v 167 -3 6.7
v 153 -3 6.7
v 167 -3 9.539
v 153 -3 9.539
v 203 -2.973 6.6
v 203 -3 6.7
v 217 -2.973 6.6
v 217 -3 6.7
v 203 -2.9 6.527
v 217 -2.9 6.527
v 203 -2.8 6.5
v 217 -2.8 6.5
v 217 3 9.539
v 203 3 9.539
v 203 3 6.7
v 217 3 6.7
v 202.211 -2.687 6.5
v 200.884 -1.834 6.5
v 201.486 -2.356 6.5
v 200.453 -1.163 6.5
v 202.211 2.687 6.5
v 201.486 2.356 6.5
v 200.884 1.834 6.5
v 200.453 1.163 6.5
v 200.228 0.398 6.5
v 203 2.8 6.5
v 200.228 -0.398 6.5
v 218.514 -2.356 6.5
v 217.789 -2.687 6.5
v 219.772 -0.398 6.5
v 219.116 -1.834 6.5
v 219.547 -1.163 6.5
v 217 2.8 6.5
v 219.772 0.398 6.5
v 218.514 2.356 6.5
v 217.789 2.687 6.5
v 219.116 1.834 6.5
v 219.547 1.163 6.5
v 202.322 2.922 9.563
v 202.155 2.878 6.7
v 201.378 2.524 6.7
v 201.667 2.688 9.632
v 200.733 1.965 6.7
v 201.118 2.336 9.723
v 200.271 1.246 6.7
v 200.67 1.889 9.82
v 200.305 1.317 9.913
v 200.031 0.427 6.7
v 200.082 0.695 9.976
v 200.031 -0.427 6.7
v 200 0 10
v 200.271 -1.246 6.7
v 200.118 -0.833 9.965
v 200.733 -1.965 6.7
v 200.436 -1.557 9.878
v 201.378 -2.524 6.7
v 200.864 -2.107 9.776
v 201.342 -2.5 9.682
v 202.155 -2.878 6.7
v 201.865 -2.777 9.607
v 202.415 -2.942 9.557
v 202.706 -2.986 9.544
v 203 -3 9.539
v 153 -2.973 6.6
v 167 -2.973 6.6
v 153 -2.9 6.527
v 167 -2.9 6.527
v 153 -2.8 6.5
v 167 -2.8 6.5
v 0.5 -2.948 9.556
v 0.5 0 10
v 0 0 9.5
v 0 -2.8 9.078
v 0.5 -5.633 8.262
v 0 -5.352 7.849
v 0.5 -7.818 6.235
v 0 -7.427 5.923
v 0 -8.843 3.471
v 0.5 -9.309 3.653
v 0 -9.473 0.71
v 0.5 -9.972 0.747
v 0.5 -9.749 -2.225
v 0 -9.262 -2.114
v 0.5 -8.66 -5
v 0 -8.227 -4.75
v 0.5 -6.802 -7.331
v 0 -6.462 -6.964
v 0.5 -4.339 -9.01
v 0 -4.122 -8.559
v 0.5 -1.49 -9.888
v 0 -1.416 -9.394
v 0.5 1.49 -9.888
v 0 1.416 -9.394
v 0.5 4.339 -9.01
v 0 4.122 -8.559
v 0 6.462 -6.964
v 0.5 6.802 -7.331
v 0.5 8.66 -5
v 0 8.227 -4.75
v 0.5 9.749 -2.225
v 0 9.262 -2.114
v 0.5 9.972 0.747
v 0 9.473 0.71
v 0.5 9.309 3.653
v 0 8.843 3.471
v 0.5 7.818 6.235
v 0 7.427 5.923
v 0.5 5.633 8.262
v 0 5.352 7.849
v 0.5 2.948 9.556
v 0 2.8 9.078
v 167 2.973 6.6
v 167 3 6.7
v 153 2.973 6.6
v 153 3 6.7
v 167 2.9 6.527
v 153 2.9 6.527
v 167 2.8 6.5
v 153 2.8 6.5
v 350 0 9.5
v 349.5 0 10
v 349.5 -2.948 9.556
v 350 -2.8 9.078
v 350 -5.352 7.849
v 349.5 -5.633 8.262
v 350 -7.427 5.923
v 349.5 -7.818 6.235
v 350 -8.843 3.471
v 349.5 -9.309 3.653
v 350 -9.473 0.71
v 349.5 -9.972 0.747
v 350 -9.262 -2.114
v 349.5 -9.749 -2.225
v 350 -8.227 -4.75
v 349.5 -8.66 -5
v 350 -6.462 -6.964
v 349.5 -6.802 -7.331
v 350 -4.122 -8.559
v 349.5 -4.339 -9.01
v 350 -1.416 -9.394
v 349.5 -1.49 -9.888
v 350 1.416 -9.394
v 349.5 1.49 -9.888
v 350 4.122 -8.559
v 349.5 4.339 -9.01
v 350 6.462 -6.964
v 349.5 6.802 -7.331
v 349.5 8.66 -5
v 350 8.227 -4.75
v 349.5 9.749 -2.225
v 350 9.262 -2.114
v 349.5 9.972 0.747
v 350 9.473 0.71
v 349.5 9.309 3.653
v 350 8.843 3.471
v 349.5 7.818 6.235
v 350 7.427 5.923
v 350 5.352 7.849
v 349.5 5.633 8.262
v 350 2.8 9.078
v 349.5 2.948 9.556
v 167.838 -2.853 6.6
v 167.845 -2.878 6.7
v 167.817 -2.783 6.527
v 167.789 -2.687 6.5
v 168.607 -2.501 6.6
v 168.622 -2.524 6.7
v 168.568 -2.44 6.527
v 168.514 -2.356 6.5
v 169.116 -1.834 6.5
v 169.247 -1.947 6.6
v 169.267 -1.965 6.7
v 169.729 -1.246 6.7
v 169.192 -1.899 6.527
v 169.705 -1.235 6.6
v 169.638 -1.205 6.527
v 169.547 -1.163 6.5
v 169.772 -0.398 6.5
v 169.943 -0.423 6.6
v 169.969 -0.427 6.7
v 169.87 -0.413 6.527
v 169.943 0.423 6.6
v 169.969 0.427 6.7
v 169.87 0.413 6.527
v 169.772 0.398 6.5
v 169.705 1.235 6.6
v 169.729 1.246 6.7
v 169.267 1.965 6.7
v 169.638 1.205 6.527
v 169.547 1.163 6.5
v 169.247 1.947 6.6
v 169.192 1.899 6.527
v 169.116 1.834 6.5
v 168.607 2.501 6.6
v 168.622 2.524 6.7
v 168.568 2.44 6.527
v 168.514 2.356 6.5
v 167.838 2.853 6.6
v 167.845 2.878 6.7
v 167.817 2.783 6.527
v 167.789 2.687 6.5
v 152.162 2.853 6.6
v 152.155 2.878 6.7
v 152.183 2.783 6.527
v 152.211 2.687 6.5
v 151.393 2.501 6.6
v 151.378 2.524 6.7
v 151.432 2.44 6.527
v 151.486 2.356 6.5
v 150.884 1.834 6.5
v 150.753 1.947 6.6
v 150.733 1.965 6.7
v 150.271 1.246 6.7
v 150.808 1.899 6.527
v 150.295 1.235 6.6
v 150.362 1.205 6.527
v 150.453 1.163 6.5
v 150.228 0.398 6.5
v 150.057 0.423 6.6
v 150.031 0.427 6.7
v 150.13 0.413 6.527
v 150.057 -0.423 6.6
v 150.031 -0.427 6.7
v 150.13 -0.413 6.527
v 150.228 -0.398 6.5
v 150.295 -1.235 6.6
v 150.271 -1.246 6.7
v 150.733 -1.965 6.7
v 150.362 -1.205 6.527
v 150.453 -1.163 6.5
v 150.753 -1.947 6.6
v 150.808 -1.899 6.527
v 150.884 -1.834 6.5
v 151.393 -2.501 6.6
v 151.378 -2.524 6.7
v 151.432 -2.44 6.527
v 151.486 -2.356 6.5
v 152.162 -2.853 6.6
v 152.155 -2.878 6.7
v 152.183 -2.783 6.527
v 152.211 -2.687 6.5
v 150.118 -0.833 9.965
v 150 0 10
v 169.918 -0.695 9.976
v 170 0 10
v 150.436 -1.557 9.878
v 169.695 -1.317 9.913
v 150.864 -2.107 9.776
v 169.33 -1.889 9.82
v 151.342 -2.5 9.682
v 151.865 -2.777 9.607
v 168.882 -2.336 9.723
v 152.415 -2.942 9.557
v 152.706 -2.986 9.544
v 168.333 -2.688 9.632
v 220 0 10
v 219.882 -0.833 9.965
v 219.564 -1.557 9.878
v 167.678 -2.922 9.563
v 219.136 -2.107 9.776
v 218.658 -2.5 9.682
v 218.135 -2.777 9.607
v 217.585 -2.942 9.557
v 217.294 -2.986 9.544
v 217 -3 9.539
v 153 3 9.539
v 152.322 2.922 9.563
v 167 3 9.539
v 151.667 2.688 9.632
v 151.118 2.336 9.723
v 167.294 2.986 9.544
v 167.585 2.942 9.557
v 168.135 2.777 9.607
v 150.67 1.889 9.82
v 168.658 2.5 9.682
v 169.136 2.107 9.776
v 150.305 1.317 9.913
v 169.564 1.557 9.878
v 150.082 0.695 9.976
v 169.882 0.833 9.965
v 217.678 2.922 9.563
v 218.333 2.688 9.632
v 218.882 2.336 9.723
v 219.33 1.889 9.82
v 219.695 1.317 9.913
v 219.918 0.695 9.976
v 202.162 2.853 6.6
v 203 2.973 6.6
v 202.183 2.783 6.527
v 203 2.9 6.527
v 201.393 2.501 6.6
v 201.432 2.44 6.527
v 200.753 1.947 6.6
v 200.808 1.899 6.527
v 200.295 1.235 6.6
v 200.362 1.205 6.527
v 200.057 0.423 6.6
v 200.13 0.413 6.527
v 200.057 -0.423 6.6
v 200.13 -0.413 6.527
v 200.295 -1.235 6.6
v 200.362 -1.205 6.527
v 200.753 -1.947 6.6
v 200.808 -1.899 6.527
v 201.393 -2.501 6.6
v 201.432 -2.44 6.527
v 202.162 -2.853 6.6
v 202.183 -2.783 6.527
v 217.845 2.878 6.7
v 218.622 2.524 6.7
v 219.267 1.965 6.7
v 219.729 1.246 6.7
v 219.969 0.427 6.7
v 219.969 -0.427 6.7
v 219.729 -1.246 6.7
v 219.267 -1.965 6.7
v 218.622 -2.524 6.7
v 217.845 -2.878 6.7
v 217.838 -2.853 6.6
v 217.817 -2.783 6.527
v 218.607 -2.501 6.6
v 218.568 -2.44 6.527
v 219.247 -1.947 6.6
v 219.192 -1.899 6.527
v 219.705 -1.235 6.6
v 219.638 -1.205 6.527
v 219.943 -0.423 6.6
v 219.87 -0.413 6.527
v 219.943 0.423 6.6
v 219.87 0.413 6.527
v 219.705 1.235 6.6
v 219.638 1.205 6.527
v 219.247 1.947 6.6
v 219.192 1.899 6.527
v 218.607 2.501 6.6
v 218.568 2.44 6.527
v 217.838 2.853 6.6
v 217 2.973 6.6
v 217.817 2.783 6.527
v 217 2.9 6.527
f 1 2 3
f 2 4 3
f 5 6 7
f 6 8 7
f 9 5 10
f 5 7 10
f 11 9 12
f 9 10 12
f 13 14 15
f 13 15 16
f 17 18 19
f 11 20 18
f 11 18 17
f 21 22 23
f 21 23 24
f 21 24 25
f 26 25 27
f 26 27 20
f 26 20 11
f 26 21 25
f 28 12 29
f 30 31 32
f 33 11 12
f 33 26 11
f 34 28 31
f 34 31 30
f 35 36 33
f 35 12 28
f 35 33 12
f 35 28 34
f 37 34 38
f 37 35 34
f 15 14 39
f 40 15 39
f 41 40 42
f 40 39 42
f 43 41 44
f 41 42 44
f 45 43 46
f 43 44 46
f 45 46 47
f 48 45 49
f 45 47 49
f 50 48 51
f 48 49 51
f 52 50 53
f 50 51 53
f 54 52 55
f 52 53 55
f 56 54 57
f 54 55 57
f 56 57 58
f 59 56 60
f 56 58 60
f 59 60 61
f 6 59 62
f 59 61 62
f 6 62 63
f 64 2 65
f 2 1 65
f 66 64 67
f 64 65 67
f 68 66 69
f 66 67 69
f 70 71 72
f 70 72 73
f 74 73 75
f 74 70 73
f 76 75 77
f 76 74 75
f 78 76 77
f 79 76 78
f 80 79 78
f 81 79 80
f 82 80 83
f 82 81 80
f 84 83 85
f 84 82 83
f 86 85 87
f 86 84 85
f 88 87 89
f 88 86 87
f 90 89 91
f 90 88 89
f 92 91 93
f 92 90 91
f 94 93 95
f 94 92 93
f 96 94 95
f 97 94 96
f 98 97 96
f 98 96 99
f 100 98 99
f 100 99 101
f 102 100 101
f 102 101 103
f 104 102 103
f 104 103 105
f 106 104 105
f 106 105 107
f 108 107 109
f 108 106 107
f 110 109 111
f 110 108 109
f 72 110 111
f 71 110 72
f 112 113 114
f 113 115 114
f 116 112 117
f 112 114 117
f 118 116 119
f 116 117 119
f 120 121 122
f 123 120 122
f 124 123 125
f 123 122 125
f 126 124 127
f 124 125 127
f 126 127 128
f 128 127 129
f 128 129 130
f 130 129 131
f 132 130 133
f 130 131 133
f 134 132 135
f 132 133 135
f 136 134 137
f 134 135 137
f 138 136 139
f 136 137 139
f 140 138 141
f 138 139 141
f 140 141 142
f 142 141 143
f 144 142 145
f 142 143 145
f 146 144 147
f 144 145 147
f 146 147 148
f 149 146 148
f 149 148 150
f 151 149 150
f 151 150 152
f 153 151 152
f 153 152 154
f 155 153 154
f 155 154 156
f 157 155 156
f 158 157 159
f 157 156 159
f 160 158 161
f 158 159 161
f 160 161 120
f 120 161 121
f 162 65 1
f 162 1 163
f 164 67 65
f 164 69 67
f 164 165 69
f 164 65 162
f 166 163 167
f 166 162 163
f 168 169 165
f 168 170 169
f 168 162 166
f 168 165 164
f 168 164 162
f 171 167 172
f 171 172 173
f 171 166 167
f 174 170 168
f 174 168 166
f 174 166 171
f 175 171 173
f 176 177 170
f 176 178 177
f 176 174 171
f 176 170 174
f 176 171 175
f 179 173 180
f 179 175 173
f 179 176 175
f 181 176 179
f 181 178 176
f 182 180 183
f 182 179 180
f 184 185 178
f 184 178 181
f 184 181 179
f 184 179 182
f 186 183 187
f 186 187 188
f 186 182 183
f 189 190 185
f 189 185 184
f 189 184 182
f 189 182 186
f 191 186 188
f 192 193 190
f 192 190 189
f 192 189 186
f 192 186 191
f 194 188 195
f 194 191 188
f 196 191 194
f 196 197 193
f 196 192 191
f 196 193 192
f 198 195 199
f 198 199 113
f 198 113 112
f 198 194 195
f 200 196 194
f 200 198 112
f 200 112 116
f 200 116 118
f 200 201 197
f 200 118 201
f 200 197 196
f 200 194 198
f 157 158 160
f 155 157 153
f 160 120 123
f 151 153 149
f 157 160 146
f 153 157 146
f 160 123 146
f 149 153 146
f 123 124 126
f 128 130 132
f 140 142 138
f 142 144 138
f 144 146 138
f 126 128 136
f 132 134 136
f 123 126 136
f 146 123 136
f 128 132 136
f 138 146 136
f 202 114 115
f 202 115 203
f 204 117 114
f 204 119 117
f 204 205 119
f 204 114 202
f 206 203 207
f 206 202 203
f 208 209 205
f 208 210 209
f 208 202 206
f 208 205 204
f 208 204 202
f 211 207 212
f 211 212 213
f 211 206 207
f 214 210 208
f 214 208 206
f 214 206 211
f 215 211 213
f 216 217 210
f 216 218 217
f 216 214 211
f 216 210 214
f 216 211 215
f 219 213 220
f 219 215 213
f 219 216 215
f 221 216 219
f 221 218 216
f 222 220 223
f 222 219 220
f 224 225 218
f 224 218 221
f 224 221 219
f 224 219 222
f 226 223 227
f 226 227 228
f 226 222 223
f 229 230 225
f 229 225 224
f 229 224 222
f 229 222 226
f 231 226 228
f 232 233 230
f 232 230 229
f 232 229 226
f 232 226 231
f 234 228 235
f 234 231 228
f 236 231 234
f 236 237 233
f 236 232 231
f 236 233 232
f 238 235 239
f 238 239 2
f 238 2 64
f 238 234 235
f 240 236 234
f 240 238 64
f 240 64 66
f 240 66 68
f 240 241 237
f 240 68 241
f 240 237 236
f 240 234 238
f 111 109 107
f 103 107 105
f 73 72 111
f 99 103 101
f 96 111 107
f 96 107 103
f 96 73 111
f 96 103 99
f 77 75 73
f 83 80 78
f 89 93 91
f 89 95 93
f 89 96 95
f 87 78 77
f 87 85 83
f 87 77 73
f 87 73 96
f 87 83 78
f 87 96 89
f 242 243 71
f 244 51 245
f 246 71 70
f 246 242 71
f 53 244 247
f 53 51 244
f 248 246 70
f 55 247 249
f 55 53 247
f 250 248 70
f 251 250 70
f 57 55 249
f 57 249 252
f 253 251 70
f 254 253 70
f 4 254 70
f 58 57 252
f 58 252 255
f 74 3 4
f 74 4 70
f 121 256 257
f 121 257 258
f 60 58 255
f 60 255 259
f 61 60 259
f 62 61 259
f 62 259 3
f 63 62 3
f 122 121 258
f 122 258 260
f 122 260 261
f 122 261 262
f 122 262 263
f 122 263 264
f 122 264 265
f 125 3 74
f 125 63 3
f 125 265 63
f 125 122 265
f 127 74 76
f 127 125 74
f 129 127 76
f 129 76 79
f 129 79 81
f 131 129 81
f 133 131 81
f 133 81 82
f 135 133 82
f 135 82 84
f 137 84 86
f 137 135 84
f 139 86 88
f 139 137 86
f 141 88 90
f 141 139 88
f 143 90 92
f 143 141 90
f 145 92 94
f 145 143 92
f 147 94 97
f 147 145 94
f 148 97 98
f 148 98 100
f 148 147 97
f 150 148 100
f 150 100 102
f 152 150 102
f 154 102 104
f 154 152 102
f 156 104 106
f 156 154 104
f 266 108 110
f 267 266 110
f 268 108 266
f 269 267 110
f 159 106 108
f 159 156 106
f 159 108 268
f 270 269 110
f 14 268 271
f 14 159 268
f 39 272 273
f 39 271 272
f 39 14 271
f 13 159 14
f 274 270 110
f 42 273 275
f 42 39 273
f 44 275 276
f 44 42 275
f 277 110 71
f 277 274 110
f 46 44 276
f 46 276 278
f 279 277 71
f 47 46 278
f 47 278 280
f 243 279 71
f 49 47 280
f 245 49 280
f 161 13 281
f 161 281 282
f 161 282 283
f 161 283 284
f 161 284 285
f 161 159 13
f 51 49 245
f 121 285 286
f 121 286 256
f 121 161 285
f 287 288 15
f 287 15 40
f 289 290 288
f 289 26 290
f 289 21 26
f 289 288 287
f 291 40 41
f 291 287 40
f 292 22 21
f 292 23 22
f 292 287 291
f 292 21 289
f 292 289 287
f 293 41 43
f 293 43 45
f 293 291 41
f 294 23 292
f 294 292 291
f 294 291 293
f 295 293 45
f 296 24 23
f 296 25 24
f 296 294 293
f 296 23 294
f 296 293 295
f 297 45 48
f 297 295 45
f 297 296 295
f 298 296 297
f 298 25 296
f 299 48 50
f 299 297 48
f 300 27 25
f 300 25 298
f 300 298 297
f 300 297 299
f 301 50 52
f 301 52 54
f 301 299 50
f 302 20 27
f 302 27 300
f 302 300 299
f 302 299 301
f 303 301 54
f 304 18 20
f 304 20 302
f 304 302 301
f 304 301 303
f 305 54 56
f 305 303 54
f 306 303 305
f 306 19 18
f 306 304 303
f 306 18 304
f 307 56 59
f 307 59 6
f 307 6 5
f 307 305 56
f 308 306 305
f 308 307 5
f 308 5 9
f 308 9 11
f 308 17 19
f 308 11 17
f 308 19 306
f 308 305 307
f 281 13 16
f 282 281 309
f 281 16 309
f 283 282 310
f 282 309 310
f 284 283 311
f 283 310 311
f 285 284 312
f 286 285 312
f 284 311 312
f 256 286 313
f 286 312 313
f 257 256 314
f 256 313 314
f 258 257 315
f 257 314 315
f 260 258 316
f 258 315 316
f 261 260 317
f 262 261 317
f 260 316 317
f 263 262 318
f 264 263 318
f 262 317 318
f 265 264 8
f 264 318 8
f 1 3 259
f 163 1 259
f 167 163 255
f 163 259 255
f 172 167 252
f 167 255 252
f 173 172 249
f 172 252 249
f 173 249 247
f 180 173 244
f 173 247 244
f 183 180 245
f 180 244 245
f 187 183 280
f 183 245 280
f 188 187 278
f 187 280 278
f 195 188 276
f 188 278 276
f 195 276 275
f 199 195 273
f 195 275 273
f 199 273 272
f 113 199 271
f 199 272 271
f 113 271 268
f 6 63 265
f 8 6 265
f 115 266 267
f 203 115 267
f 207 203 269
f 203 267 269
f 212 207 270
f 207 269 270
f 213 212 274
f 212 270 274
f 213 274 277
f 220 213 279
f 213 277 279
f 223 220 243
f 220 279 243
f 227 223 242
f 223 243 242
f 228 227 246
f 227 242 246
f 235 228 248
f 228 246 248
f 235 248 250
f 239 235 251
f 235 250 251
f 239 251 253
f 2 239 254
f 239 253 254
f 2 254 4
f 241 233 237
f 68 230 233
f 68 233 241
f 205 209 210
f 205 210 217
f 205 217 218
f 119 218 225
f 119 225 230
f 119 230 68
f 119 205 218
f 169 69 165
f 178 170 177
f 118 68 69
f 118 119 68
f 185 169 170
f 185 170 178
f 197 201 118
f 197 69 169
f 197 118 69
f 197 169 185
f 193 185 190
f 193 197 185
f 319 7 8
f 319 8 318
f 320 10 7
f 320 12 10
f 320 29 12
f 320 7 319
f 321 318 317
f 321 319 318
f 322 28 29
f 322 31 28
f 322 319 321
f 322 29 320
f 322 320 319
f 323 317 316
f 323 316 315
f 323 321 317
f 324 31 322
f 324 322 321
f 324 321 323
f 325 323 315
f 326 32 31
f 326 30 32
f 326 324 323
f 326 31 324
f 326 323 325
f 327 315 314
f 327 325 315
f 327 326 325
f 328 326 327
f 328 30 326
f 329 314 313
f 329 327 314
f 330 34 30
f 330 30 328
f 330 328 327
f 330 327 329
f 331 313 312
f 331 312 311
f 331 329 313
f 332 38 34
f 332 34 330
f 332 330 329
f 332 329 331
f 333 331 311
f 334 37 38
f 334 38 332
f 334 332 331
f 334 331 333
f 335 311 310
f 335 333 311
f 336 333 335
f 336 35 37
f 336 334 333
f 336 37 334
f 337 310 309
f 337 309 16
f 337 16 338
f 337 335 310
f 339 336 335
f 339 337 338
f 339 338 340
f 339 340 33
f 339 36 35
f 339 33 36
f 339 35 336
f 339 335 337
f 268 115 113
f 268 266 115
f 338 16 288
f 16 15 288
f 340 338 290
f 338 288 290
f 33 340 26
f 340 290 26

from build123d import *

# Parameters (mm, degrees)
SKETCH1_W           = 350
SKETCH1_H           = 10
CHAMFER1_SIZE       = 0.5
SKETCH2_W           = 20
SKETCH2_H           = 6
BOSS_EXTRUDE1_DEPTH = 3.5
FILLET1_RADIUS      = 3
FILLET1_LENGTH      = 3.5
FILLET2_RADIUS      = 3
FILLET2_LENGTH      = 3.5
FILLET3_R           = 0.2
SKETCH4_W           = 20
SKETCH4_H           = 6
BOSS_EXTRUDE3_DEPTH = 3.5
FILLET4_RADIUS      = 3
FILLET4_LENGTH      = 3.5
FILLET5_RADIUS      = 3
FILLET5_LENGTH      = 3.5
FILLET6_R           = 0.2


with BuildPart() as part:
    # Sketch1 → Revolve1 (revolve)
    with BuildSketch(Plane.XY, mode=Mode.PRIVATE) as revolve1_sk:
        with Locations((175, 5)):
            Rectangle(SKETCH1_W, SKETCH1_H)
    revolve(revolve1_sk.sketch.rotate(Axis((0, 0, 0), (1, 0, 0)), 90), axis=Axis((0, 0, 0), (1, 0, 0)))

    # Chamfer1
    chamfer1_edges = [part.edges().sort_by_distance(p)[0] for p in [
        (0, 0, -10),
        (350, 0, -10),
    ]]
    chamfer(chamfer1_edges, length=CHAMFER1_SIZE)


with BuildPart() as body_2:
    # Sketch2 → Boss-Extrude1 (new body)
    with BuildSketch(Plane.XY.offset(10)):
        with Locations((160, 0)):
            Rectangle(SKETCH2_W, SKETCH2_H)
    extrude(amount=-BOSS_EXTRUDE1_DEPTH)

    # Fillet1: full round fillet: the end face becomes a half cylinder, R = half its width
    fillet1_face = Plane((150, 0, 8.25), x_dir=(0, 0, 1), z_dir=(-1, 0, 0))  # on the end face: x along it, z out of the body
    fillet1_slab = fillet1_face.offset(-FILLET1_RADIUS / 2) * Box(FILLET1_LENGTH, 2 * FILLET1_RADIUS, FILLET1_RADIUS, mode=Mode.PRIVATE)  # the body's end, R deep
    fillet1_round = Plane((153, 0, 8.25), x_dir=(-1, 0, 0), z_dir=(0, 0, 1)) * Cylinder(FILLET1_RADIUS, FILLET1_LENGTH, mode=Mode.PRIVATE)  # its axis R under the face
    add(fillet1_slab - fillet1_round, mode=Mode.SUBTRACT)

    # Fillet2: full round fillet: the end face becomes a half cylinder, R = half its width
    fillet2_face = Plane((170, 0, 8.25), x_dir=(0, 0, 1), z_dir=(1, 0, 0))  # on the end face: x along it, z out of the body
    fillet2_slab = fillet2_face.offset(-FILLET2_RADIUS / 2) * Box(FILLET2_LENGTH, 2 * FILLET2_RADIUS, FILLET2_RADIUS, mode=Mode.PRIVATE)  # the body's end, R deep
    fillet2_round = Plane((167, 0, 8.25), x_dir=(1, 0, 0), z_dir=(0, 0, 1)) * Cylinder(FILLET2_RADIUS, FILLET2_LENGTH, mode=Mode.PRIVATE)  # its axis R under the face
    add(fillet2_slab - fillet2_round, mode=Mode.SUBTRACT)

    # Fillet3
    fillet3_edges = [body_2.edges().sort_by_distance(p)[0] for p in [
        (160, -3, 6.5),
        (150, 0, 6.5),
        (160, 3, 6.5),
        (170, 0, 6.5),
    ]]
    fillet(fillet3_edges, radius=FILLET3_R)


with BuildPart() as part_1:
    add(part.part)

    # Combine1: cut body 2
    add(body_2.part, mode=Mode.SUBTRACT)


with BuildPart() as body_2_2:
    # Sketch4 → Boss-Extrude3 (new body)
    with BuildSketch(Plane.XY.offset(10)):
        with Locations((210, 0)):
            Rectangle(SKETCH4_W, SKETCH4_H)
    extrude(amount=-BOSS_EXTRUDE3_DEPTH)

    # Fillet4: full round fillet: the end face becomes a half cylinder, R = half its width
    fillet4_face = Plane((200, 0, 8.25), x_dir=(0, 0, 1), z_dir=(-1, 0, 0))  # on the end face: x along it, z out of the body
    fillet4_slab = fillet4_face.offset(-FILLET4_RADIUS / 2) * Box(FILLET4_LENGTH, 2 * FILLET4_RADIUS, FILLET4_RADIUS, mode=Mode.PRIVATE)  # the body's end, R deep
    fillet4_round = Plane((203, 0, 8.25), x_dir=(-1, 0, 0), z_dir=(0, 0, 1)) * Cylinder(FILLET4_RADIUS, FILLET4_LENGTH, mode=Mode.PRIVATE)  # its axis R under the face
    add(fillet4_slab - fillet4_round, mode=Mode.SUBTRACT)

    # Fillet5: full round fillet: the end face becomes a half cylinder, R = half its width
    fillet5_face = Plane((220, 0, 8.25), x_dir=(0, 0, -1), z_dir=(1, 0, 0))  # on the end face: x along it, z out of the body
    fillet5_slab = fillet5_face.offset(-FILLET5_RADIUS / 2) * Box(FILLET5_LENGTH, 2 * FILLET5_RADIUS, FILLET5_RADIUS, mode=Mode.PRIVATE)  # the body's end, R deep
    fillet5_round = Plane((217, 0, 8.25), x_dir=(1, 0, 0), z_dir=(0, 0, -1)) * Cylinder(FILLET5_RADIUS, FILLET5_LENGTH, mode=Mode.PRIVATE)  # its axis R under the face
    add(fillet5_slab - fillet5_round, mode=Mode.SUBTRACT)

    # Fillet6
    fillet6_edges = [body_2_2.edges().sort_by_distance(p)[0] for p in [
        (210, -3, 6.5),
        (200, 0, 6.5),
        (210, 3, 6.5),
        (220, 0, 6.5),
    ]]
    fillet(fillet6_edges, radius=FILLET6_R)


with BuildPart() as part_2:
    add(part_1.part)

    # Combine2: cut body 2 2
    add(body_2_2.part, mode=Mode.SUBTRACT)


solid = part_2.part
